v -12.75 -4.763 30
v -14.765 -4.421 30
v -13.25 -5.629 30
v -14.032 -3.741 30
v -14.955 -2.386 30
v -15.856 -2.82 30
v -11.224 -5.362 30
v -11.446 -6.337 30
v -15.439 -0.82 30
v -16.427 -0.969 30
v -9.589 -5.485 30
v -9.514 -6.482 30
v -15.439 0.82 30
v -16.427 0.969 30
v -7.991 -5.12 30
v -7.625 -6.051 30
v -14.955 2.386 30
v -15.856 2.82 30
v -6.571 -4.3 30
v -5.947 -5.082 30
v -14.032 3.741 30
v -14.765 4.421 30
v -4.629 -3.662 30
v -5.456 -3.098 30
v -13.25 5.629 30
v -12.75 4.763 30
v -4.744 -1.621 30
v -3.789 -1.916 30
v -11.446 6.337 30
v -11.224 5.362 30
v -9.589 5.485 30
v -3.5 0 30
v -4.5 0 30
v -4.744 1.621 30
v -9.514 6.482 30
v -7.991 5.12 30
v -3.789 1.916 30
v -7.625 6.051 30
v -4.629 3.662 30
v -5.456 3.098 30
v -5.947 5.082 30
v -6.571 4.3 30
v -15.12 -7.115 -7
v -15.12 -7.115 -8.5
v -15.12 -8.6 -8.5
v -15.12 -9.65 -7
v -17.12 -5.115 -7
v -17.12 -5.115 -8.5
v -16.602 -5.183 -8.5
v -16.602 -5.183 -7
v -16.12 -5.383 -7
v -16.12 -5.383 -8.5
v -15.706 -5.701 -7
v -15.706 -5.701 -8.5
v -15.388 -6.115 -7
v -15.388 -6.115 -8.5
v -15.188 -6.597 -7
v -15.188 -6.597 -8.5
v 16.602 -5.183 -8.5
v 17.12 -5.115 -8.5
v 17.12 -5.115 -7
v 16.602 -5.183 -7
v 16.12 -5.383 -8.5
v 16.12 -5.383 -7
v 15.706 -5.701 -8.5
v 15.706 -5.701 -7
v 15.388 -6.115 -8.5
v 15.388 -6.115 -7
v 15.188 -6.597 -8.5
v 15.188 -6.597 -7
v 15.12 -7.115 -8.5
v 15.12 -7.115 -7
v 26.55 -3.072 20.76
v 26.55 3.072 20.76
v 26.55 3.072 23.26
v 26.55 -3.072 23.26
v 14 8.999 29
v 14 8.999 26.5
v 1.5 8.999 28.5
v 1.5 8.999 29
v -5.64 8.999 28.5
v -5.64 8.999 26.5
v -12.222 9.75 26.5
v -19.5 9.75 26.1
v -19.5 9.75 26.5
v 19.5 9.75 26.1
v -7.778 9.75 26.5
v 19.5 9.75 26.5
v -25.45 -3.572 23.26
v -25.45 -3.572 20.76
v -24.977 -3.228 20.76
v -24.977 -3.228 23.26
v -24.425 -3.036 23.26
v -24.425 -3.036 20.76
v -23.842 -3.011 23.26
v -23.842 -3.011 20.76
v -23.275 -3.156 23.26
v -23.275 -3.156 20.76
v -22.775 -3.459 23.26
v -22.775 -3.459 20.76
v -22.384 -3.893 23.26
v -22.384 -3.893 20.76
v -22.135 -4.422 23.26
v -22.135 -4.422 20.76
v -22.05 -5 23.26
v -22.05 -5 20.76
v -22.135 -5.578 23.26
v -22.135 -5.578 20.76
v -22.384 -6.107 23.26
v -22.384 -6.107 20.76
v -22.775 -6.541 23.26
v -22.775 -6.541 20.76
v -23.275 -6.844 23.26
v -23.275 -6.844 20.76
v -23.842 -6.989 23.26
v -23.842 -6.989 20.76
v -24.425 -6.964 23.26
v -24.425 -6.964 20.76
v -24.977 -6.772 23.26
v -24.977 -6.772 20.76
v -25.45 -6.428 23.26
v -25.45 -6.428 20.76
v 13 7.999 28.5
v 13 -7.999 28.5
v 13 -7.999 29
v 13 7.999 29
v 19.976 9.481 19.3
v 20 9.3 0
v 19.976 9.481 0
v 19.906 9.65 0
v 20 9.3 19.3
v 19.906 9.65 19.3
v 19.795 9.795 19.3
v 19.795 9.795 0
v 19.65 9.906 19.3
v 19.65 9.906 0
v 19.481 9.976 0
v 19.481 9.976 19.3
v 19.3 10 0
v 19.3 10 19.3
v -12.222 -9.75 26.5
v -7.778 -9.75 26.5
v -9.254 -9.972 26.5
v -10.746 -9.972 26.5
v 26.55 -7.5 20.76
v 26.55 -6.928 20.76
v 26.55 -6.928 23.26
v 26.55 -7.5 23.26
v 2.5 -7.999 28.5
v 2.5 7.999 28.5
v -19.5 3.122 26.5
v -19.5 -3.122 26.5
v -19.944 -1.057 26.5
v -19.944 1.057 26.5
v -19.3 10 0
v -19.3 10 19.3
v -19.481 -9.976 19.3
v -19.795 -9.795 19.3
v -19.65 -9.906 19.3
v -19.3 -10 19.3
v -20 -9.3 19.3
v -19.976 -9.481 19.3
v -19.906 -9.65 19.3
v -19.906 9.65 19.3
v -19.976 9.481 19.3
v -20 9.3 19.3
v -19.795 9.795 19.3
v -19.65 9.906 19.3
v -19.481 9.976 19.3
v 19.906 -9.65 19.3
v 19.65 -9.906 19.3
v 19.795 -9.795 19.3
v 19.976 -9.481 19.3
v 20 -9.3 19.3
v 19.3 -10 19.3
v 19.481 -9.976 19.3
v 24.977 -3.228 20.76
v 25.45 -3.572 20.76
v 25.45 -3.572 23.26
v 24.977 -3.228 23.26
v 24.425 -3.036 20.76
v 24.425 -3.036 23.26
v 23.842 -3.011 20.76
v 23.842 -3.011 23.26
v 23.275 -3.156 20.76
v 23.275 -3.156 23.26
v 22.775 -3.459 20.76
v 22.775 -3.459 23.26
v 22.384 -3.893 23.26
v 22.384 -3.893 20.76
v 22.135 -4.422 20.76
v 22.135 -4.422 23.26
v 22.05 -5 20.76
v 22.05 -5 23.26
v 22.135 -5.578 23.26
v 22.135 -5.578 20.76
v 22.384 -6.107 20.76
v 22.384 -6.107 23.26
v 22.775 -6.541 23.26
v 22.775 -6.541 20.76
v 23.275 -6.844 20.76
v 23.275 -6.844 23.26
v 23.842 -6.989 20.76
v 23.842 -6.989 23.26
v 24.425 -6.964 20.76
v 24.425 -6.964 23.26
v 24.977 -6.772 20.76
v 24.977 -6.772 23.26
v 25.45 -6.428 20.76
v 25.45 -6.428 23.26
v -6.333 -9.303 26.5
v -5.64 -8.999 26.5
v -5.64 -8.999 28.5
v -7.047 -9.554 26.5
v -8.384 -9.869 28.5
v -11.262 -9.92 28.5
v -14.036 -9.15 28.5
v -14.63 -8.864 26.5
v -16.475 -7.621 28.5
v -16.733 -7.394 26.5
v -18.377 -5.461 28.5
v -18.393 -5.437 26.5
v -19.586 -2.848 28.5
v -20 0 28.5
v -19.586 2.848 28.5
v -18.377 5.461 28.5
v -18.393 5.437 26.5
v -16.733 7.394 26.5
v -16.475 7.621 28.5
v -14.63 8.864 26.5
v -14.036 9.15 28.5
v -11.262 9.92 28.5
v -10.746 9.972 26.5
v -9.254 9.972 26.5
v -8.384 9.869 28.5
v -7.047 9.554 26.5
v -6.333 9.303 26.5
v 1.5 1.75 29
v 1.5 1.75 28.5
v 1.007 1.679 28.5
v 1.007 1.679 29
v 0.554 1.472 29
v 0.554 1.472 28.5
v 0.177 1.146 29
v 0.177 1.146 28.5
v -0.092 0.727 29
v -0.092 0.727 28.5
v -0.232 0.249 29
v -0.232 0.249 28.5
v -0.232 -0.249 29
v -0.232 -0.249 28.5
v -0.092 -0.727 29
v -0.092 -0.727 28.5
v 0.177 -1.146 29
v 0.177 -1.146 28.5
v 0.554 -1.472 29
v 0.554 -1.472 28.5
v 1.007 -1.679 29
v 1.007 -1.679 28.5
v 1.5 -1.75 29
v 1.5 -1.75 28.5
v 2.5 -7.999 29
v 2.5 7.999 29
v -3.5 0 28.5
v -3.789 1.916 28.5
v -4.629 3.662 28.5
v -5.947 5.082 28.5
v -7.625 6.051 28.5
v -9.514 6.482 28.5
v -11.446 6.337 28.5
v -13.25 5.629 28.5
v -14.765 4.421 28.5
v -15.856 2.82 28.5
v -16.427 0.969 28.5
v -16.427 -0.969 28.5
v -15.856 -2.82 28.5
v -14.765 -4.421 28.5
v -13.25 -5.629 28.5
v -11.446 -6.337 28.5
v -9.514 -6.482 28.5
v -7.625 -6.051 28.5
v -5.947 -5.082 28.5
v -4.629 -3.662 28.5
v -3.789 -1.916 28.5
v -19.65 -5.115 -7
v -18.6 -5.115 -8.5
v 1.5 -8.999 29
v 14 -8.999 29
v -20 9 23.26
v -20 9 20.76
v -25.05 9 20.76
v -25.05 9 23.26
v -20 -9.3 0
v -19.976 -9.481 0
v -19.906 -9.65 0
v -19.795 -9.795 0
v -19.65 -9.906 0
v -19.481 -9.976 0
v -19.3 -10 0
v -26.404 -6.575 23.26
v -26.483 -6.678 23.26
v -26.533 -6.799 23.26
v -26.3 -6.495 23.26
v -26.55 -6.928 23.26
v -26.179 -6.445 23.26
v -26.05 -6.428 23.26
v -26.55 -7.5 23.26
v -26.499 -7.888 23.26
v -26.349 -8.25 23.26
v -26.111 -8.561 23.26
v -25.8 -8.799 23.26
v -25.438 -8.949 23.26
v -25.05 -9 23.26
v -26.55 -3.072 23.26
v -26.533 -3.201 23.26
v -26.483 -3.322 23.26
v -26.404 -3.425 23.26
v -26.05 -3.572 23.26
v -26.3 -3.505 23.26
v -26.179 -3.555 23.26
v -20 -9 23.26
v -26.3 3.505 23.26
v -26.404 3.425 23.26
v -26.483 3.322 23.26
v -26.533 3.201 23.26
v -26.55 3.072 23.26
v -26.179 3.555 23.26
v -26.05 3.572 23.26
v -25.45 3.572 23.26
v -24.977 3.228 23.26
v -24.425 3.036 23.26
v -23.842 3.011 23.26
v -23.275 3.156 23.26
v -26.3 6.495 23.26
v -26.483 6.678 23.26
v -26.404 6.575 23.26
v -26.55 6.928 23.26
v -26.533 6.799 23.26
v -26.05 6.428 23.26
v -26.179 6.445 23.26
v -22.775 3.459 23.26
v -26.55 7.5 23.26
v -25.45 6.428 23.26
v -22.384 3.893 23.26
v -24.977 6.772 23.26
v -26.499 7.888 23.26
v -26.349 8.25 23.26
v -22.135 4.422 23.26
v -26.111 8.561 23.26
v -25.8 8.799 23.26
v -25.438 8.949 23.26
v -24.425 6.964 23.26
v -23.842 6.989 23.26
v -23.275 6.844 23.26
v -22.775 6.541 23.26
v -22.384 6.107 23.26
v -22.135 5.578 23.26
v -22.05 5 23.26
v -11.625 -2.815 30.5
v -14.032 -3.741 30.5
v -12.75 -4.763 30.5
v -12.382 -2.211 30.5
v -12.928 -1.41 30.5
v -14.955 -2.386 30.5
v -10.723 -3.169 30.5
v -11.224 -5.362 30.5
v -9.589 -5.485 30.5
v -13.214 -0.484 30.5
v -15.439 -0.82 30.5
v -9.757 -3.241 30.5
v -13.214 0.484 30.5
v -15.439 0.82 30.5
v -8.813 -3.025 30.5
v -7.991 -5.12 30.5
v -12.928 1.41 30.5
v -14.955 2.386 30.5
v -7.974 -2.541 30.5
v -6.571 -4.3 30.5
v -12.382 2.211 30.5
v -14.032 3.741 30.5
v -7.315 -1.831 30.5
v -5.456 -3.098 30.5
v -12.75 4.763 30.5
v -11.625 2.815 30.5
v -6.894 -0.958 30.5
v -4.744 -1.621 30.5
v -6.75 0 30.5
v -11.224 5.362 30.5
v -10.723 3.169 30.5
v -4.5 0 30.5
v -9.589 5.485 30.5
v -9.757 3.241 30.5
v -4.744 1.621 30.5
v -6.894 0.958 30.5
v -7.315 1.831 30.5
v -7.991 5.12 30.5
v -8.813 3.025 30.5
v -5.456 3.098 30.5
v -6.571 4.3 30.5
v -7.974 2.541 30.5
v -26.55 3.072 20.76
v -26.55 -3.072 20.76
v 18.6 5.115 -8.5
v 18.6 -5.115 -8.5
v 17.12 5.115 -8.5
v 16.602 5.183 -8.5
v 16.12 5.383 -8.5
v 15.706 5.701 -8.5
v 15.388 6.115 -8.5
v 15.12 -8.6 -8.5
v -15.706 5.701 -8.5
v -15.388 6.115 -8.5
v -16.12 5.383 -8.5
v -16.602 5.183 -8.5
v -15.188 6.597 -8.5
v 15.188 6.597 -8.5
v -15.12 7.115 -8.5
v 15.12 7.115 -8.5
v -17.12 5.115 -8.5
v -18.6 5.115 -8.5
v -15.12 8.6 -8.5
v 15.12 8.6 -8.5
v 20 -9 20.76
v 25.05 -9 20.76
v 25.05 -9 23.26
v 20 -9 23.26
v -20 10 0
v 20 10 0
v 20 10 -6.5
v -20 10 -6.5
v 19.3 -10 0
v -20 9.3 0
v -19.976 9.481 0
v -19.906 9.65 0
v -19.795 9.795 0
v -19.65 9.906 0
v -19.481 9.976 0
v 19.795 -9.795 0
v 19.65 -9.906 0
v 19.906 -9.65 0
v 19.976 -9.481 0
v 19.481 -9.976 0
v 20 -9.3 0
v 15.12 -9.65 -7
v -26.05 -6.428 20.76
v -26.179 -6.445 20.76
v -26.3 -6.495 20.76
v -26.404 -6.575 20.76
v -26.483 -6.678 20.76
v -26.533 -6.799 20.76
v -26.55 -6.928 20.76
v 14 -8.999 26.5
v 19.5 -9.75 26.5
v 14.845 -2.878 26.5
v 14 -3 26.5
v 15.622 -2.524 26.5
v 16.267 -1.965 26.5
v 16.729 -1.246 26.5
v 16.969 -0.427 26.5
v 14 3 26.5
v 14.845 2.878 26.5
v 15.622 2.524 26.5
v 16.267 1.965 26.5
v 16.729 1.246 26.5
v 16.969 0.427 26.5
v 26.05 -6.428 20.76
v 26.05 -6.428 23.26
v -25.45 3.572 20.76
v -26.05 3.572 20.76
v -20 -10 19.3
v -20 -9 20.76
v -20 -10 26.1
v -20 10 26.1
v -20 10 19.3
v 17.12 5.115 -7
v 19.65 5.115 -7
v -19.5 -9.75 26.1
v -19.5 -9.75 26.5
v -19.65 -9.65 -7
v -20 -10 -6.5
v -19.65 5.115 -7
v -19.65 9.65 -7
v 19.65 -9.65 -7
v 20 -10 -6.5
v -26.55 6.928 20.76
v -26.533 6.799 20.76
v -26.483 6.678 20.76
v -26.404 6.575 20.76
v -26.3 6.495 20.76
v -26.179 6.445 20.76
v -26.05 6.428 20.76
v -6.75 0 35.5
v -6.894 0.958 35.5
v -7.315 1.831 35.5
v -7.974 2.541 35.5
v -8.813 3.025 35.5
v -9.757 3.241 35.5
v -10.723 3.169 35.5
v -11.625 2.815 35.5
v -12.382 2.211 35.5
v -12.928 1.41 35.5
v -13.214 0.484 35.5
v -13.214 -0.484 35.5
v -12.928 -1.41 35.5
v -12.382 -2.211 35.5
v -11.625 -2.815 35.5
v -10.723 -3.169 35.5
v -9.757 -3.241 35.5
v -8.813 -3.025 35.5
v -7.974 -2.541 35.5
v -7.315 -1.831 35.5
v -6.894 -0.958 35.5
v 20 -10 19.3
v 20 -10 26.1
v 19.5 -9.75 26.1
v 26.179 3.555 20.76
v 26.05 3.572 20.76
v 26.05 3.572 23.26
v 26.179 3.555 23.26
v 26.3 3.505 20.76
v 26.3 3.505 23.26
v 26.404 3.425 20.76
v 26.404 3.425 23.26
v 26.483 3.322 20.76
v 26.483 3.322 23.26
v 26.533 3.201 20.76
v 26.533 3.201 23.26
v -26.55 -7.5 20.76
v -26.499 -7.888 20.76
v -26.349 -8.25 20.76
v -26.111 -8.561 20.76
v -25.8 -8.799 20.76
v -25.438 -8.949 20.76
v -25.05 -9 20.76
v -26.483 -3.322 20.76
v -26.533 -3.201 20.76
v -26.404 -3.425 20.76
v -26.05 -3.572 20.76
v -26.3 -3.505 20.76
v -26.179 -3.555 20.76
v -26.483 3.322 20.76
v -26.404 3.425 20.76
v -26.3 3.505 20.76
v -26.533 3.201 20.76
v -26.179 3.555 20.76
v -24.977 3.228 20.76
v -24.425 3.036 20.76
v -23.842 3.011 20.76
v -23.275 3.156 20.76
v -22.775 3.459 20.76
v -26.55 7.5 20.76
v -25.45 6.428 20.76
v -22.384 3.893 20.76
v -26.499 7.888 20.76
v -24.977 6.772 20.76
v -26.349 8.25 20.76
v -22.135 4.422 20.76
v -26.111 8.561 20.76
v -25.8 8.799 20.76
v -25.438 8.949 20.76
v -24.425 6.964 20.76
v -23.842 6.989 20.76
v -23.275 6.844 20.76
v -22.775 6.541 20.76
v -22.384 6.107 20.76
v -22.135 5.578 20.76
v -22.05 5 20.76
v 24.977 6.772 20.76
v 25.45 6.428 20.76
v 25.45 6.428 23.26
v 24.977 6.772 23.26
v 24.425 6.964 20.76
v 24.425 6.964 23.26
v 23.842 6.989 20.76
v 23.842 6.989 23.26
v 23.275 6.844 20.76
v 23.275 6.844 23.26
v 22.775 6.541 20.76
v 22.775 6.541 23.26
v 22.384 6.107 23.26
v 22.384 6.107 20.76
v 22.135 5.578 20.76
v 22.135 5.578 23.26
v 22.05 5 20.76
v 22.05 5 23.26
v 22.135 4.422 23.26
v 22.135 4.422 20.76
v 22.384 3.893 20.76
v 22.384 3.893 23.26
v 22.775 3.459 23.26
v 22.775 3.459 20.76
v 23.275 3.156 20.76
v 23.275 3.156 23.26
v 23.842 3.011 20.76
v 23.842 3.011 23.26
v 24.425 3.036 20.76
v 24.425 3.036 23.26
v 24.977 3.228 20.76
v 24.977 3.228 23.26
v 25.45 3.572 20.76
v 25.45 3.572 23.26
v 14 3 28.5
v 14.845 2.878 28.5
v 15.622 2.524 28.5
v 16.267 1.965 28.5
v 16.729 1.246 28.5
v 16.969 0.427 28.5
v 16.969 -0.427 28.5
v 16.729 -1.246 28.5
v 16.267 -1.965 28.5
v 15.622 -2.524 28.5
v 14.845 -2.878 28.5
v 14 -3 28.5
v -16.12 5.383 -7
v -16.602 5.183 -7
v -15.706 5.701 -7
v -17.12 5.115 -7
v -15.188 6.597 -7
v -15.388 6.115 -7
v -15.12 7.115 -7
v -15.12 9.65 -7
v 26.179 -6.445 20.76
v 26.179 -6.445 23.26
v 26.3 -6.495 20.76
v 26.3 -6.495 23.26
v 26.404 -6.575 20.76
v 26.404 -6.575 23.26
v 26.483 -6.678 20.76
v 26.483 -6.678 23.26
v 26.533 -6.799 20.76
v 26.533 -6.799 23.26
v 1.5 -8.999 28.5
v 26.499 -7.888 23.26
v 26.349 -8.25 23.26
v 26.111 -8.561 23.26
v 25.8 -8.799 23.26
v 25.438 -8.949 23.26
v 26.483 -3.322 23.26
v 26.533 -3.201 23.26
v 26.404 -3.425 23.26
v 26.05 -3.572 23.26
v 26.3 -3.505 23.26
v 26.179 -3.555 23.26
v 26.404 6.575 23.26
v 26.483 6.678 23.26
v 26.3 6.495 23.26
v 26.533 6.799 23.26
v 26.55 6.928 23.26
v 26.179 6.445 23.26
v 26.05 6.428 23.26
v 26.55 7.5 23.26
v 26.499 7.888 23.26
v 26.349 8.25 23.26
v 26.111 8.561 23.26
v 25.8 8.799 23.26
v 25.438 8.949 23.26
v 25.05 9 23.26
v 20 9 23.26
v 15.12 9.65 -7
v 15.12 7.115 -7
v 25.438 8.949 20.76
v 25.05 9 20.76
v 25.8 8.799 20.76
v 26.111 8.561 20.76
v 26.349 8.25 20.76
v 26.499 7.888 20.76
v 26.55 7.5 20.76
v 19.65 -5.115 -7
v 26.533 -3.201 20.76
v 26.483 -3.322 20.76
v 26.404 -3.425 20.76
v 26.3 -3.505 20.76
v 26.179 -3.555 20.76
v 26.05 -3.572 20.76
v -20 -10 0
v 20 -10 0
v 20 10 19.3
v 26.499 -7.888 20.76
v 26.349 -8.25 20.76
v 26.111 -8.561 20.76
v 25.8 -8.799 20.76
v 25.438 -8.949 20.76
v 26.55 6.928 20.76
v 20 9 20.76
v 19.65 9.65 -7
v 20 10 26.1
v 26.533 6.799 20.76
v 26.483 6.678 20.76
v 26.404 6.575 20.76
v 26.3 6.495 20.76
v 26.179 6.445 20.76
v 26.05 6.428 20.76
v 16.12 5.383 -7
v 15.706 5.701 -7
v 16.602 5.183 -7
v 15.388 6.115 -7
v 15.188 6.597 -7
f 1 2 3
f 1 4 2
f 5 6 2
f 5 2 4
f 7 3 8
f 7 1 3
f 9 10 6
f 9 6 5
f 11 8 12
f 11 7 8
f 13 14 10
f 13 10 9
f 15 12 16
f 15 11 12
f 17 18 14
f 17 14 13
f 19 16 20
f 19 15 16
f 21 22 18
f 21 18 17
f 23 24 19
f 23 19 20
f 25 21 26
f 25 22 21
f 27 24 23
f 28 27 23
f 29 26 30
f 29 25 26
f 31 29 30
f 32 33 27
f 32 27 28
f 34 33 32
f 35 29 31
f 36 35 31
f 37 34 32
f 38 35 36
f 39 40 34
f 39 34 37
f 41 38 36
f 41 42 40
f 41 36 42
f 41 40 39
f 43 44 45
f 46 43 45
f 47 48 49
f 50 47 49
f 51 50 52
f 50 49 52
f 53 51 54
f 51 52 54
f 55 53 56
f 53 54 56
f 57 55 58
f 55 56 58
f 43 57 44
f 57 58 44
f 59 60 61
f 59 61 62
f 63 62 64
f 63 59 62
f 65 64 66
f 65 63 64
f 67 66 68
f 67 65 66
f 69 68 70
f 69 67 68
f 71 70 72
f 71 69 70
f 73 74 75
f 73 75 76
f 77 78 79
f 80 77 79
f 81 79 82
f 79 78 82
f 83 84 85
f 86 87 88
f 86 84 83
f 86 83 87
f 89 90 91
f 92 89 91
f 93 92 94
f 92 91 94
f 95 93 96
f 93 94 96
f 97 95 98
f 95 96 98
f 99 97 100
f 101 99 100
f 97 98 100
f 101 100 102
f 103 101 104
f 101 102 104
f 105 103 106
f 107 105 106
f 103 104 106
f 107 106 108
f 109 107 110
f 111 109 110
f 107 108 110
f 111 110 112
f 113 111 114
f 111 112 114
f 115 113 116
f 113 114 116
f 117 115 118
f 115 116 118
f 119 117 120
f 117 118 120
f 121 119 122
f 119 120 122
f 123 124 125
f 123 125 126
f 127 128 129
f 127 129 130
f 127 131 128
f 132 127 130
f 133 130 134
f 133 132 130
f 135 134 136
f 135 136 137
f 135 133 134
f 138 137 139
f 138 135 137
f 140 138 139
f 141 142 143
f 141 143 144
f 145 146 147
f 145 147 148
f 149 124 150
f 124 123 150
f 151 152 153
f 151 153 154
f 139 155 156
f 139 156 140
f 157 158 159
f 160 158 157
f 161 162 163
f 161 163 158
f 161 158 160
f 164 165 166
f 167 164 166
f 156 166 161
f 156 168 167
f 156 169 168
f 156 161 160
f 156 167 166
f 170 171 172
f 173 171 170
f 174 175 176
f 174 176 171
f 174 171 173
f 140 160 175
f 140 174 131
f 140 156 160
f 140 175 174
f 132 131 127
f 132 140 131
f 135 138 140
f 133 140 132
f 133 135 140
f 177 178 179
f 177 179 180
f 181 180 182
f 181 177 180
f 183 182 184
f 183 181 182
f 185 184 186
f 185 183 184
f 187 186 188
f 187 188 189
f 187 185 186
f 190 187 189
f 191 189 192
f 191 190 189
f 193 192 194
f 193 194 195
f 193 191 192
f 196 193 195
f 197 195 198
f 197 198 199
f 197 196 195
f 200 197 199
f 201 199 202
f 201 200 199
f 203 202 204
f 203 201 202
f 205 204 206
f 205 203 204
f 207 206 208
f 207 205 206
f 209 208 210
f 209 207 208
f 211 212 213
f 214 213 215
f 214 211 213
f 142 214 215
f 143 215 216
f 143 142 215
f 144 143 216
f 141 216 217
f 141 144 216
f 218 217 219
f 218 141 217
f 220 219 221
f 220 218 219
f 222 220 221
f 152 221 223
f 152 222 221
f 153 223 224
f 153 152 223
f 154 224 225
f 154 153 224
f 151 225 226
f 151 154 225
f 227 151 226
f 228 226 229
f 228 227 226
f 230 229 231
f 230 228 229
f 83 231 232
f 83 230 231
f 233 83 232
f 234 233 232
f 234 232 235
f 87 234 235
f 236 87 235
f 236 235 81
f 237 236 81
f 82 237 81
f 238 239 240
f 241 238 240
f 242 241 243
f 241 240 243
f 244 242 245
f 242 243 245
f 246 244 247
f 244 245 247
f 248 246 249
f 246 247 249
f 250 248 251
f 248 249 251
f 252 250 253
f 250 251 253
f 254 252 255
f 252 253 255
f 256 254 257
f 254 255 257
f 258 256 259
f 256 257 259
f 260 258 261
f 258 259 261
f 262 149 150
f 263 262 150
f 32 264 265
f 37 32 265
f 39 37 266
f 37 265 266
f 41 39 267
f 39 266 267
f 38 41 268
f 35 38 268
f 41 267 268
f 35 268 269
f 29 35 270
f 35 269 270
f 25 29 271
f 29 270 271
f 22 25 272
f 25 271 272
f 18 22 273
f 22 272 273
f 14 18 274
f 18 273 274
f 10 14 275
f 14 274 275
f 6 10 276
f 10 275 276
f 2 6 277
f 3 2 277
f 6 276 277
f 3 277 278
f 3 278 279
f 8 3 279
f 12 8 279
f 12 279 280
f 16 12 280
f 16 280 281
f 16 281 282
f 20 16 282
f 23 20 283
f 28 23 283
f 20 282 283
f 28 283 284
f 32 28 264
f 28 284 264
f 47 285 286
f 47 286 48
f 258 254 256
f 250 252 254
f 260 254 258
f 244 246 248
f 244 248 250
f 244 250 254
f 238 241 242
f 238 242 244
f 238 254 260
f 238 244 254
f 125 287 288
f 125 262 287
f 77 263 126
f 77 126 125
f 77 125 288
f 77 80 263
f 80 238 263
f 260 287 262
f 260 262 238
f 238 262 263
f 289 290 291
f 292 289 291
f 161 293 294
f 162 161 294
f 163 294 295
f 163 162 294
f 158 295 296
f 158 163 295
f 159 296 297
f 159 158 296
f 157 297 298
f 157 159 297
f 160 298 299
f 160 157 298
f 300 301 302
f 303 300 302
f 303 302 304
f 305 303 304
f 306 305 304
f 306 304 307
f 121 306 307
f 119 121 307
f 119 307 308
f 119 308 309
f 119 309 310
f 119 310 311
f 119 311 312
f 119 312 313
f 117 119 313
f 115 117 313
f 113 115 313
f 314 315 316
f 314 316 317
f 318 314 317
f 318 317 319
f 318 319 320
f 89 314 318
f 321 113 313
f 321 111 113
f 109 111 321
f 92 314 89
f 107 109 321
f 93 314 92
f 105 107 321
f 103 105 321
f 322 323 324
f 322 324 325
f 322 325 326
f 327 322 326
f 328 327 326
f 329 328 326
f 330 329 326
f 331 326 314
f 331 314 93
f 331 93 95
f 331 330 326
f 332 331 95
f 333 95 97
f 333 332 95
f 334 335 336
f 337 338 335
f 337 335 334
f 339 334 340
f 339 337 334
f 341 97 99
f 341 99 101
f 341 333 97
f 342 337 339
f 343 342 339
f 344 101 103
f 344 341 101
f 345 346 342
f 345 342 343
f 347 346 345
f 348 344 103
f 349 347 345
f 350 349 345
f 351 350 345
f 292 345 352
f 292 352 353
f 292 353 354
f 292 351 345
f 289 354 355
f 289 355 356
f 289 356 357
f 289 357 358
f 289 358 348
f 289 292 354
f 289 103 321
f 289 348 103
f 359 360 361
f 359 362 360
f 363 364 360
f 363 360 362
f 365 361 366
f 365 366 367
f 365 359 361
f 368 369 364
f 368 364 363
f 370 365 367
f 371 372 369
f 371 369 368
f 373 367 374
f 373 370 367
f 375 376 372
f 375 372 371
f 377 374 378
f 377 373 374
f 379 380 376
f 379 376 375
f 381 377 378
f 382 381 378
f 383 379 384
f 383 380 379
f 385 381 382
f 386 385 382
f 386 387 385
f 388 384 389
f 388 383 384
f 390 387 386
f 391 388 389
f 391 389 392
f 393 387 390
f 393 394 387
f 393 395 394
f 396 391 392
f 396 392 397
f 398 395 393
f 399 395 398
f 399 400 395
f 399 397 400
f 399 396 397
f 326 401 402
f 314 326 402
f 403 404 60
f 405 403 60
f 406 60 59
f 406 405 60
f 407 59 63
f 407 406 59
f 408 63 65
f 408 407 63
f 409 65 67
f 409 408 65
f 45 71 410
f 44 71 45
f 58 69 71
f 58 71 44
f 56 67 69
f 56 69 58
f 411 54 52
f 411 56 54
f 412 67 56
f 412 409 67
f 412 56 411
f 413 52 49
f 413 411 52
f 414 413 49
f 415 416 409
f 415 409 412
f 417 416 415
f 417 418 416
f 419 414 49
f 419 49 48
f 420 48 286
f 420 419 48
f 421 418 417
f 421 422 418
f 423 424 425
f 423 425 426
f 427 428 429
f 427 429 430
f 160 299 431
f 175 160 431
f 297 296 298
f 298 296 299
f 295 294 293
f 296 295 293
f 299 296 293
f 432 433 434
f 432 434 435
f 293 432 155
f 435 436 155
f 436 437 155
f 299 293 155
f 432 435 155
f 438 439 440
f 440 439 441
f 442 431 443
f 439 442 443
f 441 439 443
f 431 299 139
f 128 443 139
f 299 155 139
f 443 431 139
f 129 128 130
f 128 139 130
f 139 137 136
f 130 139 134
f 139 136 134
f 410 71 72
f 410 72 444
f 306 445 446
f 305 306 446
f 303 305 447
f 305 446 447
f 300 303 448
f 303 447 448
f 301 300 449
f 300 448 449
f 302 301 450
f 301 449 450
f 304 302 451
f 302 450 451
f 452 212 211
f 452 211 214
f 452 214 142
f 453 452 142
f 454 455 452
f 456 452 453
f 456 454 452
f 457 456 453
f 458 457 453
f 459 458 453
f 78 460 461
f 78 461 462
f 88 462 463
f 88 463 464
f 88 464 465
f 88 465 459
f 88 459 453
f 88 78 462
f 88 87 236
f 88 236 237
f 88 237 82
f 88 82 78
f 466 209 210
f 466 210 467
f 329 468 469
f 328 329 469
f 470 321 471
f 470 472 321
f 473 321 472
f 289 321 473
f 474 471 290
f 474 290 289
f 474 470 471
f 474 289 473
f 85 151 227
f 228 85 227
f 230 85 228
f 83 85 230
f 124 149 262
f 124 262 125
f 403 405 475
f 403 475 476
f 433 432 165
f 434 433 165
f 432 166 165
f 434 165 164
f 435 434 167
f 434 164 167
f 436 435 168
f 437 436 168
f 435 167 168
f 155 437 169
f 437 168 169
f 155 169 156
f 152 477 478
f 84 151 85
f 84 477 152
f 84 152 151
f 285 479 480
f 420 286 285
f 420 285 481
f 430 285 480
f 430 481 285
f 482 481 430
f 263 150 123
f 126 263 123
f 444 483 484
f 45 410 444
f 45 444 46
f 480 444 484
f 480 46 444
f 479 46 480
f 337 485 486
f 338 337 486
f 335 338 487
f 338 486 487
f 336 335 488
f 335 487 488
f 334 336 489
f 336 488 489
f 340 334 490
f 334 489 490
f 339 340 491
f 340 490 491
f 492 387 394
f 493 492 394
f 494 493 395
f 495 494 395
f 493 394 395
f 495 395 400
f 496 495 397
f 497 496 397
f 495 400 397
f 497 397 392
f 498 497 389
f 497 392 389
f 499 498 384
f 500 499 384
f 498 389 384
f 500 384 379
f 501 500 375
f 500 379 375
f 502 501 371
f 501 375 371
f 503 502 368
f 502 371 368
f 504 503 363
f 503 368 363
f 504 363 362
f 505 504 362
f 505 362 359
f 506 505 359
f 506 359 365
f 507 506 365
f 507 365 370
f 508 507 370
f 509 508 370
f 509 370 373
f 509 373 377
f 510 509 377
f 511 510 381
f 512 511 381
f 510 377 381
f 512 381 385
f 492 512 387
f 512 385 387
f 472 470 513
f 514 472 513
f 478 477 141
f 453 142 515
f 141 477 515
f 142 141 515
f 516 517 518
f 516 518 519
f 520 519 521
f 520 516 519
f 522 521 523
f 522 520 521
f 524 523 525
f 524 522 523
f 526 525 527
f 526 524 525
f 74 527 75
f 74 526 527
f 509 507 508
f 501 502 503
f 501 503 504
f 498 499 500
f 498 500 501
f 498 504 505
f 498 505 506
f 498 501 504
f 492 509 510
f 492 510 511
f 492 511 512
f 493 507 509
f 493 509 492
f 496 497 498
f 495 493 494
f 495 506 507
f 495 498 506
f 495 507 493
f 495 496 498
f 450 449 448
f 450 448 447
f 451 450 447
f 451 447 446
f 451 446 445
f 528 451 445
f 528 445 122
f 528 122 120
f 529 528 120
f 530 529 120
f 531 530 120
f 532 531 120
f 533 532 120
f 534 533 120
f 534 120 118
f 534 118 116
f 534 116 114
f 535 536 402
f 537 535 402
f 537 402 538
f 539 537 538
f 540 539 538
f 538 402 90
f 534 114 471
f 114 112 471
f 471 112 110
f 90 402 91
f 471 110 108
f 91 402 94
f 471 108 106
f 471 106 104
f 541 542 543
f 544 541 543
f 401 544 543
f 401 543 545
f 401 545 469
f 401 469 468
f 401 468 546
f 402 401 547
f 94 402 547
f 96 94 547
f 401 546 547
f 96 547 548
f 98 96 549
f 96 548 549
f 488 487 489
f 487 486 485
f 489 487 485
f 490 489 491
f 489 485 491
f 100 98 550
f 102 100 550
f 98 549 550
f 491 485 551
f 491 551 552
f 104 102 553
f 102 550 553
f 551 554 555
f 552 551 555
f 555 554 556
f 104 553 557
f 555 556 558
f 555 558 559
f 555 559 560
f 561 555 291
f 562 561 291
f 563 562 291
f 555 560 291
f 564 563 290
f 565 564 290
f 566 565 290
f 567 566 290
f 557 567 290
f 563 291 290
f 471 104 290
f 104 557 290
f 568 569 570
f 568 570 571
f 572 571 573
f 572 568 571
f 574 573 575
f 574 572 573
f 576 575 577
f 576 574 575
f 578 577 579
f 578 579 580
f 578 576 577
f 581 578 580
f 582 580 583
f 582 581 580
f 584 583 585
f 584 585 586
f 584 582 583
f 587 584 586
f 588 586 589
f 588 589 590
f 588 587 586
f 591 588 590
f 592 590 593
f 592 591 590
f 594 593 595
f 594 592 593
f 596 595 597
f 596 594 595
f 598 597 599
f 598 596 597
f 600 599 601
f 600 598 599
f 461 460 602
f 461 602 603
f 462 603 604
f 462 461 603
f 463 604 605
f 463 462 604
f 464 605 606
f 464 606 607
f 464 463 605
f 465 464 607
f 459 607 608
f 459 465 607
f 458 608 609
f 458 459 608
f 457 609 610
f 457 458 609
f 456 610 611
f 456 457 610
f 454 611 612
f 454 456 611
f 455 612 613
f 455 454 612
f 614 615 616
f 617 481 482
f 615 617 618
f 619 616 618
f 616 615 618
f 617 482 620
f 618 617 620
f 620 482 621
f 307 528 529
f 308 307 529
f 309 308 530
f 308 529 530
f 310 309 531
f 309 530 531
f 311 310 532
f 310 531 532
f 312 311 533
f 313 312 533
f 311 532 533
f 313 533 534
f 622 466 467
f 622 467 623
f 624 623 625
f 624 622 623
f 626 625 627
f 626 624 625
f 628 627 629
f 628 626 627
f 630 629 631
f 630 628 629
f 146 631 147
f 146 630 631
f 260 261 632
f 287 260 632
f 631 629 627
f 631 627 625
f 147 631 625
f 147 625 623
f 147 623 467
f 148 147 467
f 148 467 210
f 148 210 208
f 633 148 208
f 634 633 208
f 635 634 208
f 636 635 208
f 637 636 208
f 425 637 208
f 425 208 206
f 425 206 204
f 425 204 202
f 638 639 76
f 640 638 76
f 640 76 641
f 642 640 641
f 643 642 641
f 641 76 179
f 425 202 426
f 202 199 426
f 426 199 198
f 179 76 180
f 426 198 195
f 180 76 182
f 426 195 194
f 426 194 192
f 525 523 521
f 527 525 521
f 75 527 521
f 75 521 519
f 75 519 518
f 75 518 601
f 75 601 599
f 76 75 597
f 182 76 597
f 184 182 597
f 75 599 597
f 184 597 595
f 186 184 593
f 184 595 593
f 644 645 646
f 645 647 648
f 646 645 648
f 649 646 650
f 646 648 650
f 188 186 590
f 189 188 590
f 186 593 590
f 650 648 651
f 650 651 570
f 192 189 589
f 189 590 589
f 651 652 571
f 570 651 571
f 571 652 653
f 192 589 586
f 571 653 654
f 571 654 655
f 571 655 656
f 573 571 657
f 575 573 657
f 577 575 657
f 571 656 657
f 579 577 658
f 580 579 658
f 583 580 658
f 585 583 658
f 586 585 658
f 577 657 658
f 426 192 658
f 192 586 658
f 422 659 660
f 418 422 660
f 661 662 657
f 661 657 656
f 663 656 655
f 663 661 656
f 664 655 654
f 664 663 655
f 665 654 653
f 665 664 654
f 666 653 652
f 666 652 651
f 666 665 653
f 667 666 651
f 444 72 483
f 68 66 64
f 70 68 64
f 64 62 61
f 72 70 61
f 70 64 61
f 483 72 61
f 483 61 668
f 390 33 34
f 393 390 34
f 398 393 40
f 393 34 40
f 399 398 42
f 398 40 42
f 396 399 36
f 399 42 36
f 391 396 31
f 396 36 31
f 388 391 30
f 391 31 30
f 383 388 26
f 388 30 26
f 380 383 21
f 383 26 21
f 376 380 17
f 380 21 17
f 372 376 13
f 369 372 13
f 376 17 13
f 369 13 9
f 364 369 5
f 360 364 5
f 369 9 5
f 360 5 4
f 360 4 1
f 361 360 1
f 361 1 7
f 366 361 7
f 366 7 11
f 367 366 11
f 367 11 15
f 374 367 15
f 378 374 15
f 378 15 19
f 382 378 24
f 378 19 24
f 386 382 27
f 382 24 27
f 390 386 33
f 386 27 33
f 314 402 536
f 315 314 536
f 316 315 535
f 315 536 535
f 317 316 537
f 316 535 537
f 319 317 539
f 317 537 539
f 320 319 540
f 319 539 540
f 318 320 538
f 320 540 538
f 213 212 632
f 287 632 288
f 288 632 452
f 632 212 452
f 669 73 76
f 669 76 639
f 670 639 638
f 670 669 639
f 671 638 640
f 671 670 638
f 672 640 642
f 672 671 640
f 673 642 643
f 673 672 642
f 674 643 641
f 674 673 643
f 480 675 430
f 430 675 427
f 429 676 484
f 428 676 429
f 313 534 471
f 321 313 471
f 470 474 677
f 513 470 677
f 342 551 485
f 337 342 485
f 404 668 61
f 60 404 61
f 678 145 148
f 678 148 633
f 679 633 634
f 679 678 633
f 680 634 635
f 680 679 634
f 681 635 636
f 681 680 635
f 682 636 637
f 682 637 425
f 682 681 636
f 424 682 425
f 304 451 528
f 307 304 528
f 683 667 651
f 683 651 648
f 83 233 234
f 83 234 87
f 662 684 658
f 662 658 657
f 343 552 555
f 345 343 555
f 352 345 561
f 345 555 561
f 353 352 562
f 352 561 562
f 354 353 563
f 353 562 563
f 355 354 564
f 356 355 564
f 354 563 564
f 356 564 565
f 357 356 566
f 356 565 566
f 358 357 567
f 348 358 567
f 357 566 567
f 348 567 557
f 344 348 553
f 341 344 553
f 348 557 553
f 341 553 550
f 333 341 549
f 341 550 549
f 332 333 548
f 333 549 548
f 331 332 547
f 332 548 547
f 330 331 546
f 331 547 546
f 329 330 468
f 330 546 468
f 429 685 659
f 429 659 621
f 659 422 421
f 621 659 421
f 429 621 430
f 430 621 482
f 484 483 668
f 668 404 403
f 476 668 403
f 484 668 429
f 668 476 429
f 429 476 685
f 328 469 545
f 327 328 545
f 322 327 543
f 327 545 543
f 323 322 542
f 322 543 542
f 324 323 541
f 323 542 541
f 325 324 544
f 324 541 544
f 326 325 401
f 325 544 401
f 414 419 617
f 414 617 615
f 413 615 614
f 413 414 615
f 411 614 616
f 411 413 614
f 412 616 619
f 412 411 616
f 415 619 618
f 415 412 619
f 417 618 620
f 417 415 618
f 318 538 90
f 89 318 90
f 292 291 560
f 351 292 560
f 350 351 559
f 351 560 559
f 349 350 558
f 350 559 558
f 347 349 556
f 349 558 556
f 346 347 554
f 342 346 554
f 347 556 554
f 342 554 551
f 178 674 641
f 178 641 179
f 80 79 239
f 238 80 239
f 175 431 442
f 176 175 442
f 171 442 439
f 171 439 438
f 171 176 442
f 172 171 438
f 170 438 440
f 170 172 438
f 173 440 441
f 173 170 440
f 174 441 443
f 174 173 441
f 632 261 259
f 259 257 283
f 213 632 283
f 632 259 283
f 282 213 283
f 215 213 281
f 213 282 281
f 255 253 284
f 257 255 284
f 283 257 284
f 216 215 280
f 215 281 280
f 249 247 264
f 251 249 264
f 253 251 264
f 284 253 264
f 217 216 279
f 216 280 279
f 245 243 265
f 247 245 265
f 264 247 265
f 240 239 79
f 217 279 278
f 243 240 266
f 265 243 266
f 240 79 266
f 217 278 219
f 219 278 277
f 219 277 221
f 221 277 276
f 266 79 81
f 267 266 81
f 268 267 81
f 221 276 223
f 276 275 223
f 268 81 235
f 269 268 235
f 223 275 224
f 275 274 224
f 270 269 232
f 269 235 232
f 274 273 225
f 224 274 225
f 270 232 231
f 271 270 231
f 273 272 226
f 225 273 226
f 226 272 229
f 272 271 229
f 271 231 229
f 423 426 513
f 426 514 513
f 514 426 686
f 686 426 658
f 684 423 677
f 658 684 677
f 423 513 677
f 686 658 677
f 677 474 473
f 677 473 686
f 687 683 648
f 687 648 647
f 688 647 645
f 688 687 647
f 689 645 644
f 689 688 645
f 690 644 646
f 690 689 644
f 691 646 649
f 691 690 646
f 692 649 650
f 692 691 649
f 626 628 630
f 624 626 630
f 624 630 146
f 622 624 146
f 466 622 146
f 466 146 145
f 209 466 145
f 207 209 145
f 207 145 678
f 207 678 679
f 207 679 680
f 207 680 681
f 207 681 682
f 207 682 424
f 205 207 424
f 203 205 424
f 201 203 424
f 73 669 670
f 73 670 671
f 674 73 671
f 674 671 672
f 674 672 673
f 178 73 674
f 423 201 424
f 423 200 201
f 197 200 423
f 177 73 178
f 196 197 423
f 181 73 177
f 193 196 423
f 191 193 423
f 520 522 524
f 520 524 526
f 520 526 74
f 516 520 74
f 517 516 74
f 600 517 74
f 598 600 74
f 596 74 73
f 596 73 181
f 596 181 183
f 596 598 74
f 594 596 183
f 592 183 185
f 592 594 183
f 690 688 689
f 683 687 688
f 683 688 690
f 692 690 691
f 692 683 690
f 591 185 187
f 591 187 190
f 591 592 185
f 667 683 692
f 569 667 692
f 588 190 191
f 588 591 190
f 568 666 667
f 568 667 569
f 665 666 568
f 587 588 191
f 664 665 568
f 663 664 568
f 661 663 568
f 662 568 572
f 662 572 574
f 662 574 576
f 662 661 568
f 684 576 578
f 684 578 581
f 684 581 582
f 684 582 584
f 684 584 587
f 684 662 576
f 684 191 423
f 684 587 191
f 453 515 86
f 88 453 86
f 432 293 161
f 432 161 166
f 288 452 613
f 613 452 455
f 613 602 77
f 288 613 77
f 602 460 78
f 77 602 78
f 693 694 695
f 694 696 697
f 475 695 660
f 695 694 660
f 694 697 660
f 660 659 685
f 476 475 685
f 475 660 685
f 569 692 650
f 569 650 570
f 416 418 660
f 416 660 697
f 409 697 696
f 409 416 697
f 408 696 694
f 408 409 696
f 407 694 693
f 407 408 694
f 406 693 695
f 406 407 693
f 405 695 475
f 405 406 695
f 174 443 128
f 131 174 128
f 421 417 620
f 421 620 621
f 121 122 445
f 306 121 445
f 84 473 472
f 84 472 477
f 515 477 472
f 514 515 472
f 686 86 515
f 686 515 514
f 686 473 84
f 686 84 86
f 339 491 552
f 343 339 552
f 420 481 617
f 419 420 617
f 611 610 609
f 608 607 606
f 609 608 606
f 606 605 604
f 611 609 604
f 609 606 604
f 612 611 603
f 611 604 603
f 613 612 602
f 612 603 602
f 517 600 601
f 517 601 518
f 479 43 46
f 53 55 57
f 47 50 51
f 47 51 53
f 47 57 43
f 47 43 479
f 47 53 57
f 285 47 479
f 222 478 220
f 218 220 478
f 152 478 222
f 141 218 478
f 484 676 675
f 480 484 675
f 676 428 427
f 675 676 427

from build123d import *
from OCP.BRepFilletAPI import BRepFilletAPI_MakeChamfer

# Parameters (mm, degrees)
SKETCH1_W            = 40
SKETCH1_H            = 20
BOSS_EXTRUDE1_DEPTH  = 19.3
SKETCH2_W            = 40
SKETCH2_H            = 20
BOSS_EXTRUDE2_DEPTH  = 6.8
SKETCH3_W            = 40
SKETCH3_H            = 20
BOSS_EXTRUDE3_DEPTH  = 8.5
CHAMFER1_SIZE        = 2
CHAMFER1_SIZE2       = 1.400415076
CUT_EXTRUDE1_DEPTH   = 1.5
SKETCH5_W            = 39
SKETCH5_H            = 19.5
BOSS_EXTRUDE5_DEPTH  = 0.4
BOSS_EXTRUDE6_DEPTH  = 2
SKETCH7_R            = 6.5
BOSS_EXTRUDE7_DEPTH  = 1.5
SKETCH8_R            = 5.5
BOSS_EXTRUDE8_DEPTH  = 0.5
SKETCH9_R            = 3.25
BOSS_EXTRUDE9_DEPTH  = 5
SKETCH10_W           = 10.5
SKETCH10_H           = 15.998933302
BOSS_EXTRUDE10_DEPTH = 0.5
FILLET1_R            = 0.7
BOSS_EXTRUDE11_START = -5.74
BOSS_EXTRUDE11_DEPTH = 2.5


with BuildPart() as part:
    # Sketch1 → Boss-Extrude1 (new body)
    with BuildSketch(Plane.XY):
        Rectangle(SKETCH1_W, SKETCH1_H)
    extrude(amount=BOSS_EXTRUDE1_DEPTH)

    # Fillet1
    fillet1_edges = [part.edges().sort_by_distance(p)[0] for p in [
        (20, -10, 9.65),
        (-20, -10, 9.65),
        (-20, 10, 9.65),
        (20, 10, 9.65),
    ]]
    fillet(fillet1_edges, radius=FILLET1_R)


with BuildPart() as body_2:
    # Sketch2 → Boss-Extrude2 (new body)
    with BuildSketch(Plane.XY.offset(19.3)):
        Rectangle(SKETCH2_W, SKETCH2_H)
    extrude(amount=BOSS_EXTRUDE2_DEPTH)

    # Sketch5 → Boss-Extrude5 (add)
    with BuildSketch(Plane.XY.offset(26.1)):
        Rectangle(SKETCH5_W, SKETCH5_H)
    extrude(amount=BOSS_EXTRUDE5_DEPTH)

    # Sketch6 → Boss-Extrude6 (add)
    with BuildSketch(Plane.XY.offset(26.5)):
        with BuildLine():
            Line((-5.64, 8.999466651), (14, 8.999466651))
            Line((14, 8.999466651), (14, 3))
            ThreePointArc((14, 3), (17, 0), (14, -3))
            Line((14, -3), (14, -8.999466651))
            Line((14, -8.999466651), (-5.64, -8.999466651))
            ThreePointArc((-5.64, -8.999466651), (-20, 0), (-5.64, 8.999466651))
        make_face()
    extrude(amount=BOSS_EXTRUDE6_DEPTH)

    # Sketch7 → Boss-Extrude7 (add)
    with BuildSketch(Plane.XY.offset(28.5)):
        with Locations((-10, 0)):
            Circle(SKETCH7_R)
    extrude(amount=BOSS_EXTRUDE7_DEPTH)

    # Sketch8 → Boss-Extrude8 (add)
    with BuildSketch(Plane.XY.offset(30)):
        with Locations((-10, 0)):
            Circle(SKETCH8_R)
    extrude(amount=BOSS_EXTRUDE8_DEPTH)

    # Sketch9 → Boss-Extrude9 (add)
    with BuildSketch(Plane.XY.offset(30.5)):
        with Locations((-10, 0)):
            Circle(SKETCH9_R)
    extrude(amount=BOSS_EXTRUDE9_DEPTH)

    # Sketch10 → Boss-Extrude10 (add)
    with BuildSketch(Plane.XY.offset(28.5)):
        with BuildLine():
            Line((14, 8.999466651), (1.5, 8.999466651))
            Line((1.5, 8.999466651), (1.5, 1.75))
            ThreePointArc((1.5, 1.75), (-0.25, 0), (1.5, -1.75))
            Line((1.5, -1.75), (1.5, -8.999466651))
            Line((1.5, -8.999466651), (14, -8.999466651))
            Line((14, -8.999466651), (14, 8.999466651))
        make_face()
        with Locations((7.75, 0)):
            Rectangle(SKETCH10_W, SKETCH10_H, mode=Mode.SUBTRACT)
    extrude(amount=BOSS_EXTRUDE10_DEPTH)

    # Sketch11 → Boss-Extrude11 (add)
    with BuildSketch(Plane.XY.offset(26.5).offset(BOSS_EXTRUDE11_START)):
        with BuildLine():
            Line((20, 9), (25.05, 9))
            ThreePointArc((25.05, 9), (26.110660172, 8.560660172), (26.55, 7.5))
            Line((26.55, 7.5), (26.55, 6.928285686))
            ThreePointArc((26.55, 6.928285686), (26.403553391, 6.574732295), (26.05, 6.428285686))
            Line((26.05, 6.428285686), (25.45, 6.428285686))
            ThreePointArc((25.45, 6.428285686), (22.05, 5), (25.45, 3.571714314))
            Line((25.45, 3.571714314), (26.05, 3.571714314))
            ThreePointArc((26.05, 3.571714314), (26.403553391, 3.425267705), (26.55, 3.071714314))
            Line((26.55, 3.071714314), (26.55, -3.071714314))
            ThreePointArc((26.55, -3.071714314), (26.403553391, -3.425267705), (26.05, -3.571714314))
            Line((26.05, -3.571714314), (25.45, -3.571714314))
            ThreePointArc((25.45, -3.571714314), (22.05, -5), (25.45, -6.428285686))
            Line((25.45, -6.428285686), (26.05, -6.428285686))
            ThreePointArc((26.05, -6.428285686), (26.403553391, -6.574732295), (26.55, -6.928285686))
            Line((26.55, -6.928285686), (26.55, -7.5))
            ThreePointArc((26.55, -7.5), (26.110660172, -8.560660172), (25.05, -9))
            Line((25.05, -9), (20, -9))
            Line((20, -9), (20, 9))
        make_face()
    boss_extrude11 = extrude(amount=BOSS_EXTRUDE11_DEPTH)

    # Mirror1: Boss-Extrude11 across plane
    add(boss_extrude11.mirror(Plane(origin=(0, 0, 0), x_dir=(0, 0, 1), z_dir=(1, 0, 0))))


with BuildPart() as body_3:
    # Sketch3 → Boss-Extrude3 (new body)
    with BuildSketch(Plane(origin=(0, 0, 0), x_dir=(-1, 0, 0), z_dir=(0, 0, -1))):
        Rectangle(SKETCH3_W, SKETCH3_H)
    extrude(amount=BOSS_EXTRUDE3_DEPTH)

    # Chamfer1: one chamfer whose edges measure the first distance from different faces: ONE call of the kernel's chamfer builder (chamfer() names one face for all edges)
    chamfer1_edges_1 = [body_3.edges().sort_by_distance(p)[0] for p in [
        (0, -10, -8.5),
    ]]
    chamfer1_side_1 = [body_3.faces().sort_by_distance(p)[0] for p in [
        (0, -10, -4.25),
    ]]
    chamfer1_edges_2 = [body_3.edges().sort_by_distance(p)[0] for p in [
        (-20, 0, -8.5),
    ]]
    chamfer1_side_2 = [body_3.faces().sort_by_distance(p)[0] for p in [
        (-20, 0, -4.25),
    ]]
    chamfer1_edges_3 = [body_3.edges().sort_by_distance(p)[0] for p in [
        (0, 10, -8.5),
    ]]
    chamfer1_side_3 = [body_3.faces().sort_by_distance(p)[0] for p in [
        (0, 10, -4.25),
    ]]
    chamfer1_edges_4 = [body_3.edges().sort_by_distance(p)[0] for p in [
        (20, 0, -8.5),
    ]]
    chamfer1_side_4 = [body_3.faces().sort_by_distance(p)[0] for p in [
        (20, 0, -4.25),
    ]]
    chamfer1 = BRepFilletAPI_MakeChamfer(body_3.part.solid().wrapped)
    for e in chamfer1_edges_1:
        chamfer1.Add(CHAMFER1_SIZE, CHAMFER1_SIZE2, e.wrapped, chamfer1_side_1[0].wrapped)  # the first distance lies on this face
    for e in chamfer1_edges_2:
        chamfer1.Add(CHAMFER1_SIZE, CHAMFER1_SIZE2, e.wrapped, chamfer1_side_2[0].wrapped)  # the first distance lies on this face
    for e in chamfer1_edges_3:
        chamfer1.Add(CHAMFER1_SIZE, CHAMFER1_SIZE2, e.wrapped, chamfer1_side_3[0].wrapped)  # the first distance lies on this face
    for e in chamfer1_edges_4:
        chamfer1.Add(CHAMFER1_SIZE, CHAMFER1_SIZE2, e.wrapped, chamfer1_side_4[0].wrapped)  # the first distance lies on this face
    add(Compound.cast(chamfer1.Shape()), mode=Mode.REPLACE)

    # Sketch4 → Cut-Extrude1 (cut)
    with BuildSketch(Plane(origin=(0, 0, -8.5), x_dir=(-1, 0, 0), z_dir=(0, 0, -1))):
        with BuildLine():
            Line((-20, 10), (-15.12, 10))
            Line((-15.12, 10), (-15.12, 7.115114037))
            ThreePointArc((-15.12, 7.115114037), (-15.705786438, 5.700900474), (-17.12, 5.115114037))
            Line((-17.12, 5.115114037), (-20, 5.115114037))
            Line((-20, 5.115114037), (-20, 10))
        make_face()
        with BuildLine():
            Line((20, 5.115114037), (17.12, 5.115114037))
            ThreePointArc((17.12, 5.115114037), (15.705786438, 5.700900474), (15.12, 7.115114037))
            Line((15.12, 7.115114037), (15.12, 10))
            Line((15.12, 10), (20, 10))
            Line((20, 10), (20, 5.115114037))
        make_face()
        with BuildLine():
            Line((20, -10), (20, -5.115114037))
            Line((20, -5.115114037), (17.12, -5.115114037))
            ThreePointArc((17.12, -5.115114037), (15.705786438, -5.700900474), (15.12, -7.115114037))
            Line((15.12, -7.115114037), (15.12, -10))
            Line((15.12, -10), (20, -10))
        make_face()
        with BuildLine():
            Line((-20, -5.115114037), (-17.12, -5.115114037))
            ThreePointArc((-17.12, -5.115114037), (-15.705786438, -5.700900474), (-15.12, -7.115114037))
            Line((-15.12, -7.115114037), (-15.12, -10))
            Line((-15.12, -10), (-20, -10))
            Line((-20, -10), (-20, -5.115114037))
        make_face()
    extrude(amount=-CUT_EXTRUDE1_DEPTH, mode=Mode.SUBTRACT)


solid = Compound([part.part, body_2.part, body_3.part])
